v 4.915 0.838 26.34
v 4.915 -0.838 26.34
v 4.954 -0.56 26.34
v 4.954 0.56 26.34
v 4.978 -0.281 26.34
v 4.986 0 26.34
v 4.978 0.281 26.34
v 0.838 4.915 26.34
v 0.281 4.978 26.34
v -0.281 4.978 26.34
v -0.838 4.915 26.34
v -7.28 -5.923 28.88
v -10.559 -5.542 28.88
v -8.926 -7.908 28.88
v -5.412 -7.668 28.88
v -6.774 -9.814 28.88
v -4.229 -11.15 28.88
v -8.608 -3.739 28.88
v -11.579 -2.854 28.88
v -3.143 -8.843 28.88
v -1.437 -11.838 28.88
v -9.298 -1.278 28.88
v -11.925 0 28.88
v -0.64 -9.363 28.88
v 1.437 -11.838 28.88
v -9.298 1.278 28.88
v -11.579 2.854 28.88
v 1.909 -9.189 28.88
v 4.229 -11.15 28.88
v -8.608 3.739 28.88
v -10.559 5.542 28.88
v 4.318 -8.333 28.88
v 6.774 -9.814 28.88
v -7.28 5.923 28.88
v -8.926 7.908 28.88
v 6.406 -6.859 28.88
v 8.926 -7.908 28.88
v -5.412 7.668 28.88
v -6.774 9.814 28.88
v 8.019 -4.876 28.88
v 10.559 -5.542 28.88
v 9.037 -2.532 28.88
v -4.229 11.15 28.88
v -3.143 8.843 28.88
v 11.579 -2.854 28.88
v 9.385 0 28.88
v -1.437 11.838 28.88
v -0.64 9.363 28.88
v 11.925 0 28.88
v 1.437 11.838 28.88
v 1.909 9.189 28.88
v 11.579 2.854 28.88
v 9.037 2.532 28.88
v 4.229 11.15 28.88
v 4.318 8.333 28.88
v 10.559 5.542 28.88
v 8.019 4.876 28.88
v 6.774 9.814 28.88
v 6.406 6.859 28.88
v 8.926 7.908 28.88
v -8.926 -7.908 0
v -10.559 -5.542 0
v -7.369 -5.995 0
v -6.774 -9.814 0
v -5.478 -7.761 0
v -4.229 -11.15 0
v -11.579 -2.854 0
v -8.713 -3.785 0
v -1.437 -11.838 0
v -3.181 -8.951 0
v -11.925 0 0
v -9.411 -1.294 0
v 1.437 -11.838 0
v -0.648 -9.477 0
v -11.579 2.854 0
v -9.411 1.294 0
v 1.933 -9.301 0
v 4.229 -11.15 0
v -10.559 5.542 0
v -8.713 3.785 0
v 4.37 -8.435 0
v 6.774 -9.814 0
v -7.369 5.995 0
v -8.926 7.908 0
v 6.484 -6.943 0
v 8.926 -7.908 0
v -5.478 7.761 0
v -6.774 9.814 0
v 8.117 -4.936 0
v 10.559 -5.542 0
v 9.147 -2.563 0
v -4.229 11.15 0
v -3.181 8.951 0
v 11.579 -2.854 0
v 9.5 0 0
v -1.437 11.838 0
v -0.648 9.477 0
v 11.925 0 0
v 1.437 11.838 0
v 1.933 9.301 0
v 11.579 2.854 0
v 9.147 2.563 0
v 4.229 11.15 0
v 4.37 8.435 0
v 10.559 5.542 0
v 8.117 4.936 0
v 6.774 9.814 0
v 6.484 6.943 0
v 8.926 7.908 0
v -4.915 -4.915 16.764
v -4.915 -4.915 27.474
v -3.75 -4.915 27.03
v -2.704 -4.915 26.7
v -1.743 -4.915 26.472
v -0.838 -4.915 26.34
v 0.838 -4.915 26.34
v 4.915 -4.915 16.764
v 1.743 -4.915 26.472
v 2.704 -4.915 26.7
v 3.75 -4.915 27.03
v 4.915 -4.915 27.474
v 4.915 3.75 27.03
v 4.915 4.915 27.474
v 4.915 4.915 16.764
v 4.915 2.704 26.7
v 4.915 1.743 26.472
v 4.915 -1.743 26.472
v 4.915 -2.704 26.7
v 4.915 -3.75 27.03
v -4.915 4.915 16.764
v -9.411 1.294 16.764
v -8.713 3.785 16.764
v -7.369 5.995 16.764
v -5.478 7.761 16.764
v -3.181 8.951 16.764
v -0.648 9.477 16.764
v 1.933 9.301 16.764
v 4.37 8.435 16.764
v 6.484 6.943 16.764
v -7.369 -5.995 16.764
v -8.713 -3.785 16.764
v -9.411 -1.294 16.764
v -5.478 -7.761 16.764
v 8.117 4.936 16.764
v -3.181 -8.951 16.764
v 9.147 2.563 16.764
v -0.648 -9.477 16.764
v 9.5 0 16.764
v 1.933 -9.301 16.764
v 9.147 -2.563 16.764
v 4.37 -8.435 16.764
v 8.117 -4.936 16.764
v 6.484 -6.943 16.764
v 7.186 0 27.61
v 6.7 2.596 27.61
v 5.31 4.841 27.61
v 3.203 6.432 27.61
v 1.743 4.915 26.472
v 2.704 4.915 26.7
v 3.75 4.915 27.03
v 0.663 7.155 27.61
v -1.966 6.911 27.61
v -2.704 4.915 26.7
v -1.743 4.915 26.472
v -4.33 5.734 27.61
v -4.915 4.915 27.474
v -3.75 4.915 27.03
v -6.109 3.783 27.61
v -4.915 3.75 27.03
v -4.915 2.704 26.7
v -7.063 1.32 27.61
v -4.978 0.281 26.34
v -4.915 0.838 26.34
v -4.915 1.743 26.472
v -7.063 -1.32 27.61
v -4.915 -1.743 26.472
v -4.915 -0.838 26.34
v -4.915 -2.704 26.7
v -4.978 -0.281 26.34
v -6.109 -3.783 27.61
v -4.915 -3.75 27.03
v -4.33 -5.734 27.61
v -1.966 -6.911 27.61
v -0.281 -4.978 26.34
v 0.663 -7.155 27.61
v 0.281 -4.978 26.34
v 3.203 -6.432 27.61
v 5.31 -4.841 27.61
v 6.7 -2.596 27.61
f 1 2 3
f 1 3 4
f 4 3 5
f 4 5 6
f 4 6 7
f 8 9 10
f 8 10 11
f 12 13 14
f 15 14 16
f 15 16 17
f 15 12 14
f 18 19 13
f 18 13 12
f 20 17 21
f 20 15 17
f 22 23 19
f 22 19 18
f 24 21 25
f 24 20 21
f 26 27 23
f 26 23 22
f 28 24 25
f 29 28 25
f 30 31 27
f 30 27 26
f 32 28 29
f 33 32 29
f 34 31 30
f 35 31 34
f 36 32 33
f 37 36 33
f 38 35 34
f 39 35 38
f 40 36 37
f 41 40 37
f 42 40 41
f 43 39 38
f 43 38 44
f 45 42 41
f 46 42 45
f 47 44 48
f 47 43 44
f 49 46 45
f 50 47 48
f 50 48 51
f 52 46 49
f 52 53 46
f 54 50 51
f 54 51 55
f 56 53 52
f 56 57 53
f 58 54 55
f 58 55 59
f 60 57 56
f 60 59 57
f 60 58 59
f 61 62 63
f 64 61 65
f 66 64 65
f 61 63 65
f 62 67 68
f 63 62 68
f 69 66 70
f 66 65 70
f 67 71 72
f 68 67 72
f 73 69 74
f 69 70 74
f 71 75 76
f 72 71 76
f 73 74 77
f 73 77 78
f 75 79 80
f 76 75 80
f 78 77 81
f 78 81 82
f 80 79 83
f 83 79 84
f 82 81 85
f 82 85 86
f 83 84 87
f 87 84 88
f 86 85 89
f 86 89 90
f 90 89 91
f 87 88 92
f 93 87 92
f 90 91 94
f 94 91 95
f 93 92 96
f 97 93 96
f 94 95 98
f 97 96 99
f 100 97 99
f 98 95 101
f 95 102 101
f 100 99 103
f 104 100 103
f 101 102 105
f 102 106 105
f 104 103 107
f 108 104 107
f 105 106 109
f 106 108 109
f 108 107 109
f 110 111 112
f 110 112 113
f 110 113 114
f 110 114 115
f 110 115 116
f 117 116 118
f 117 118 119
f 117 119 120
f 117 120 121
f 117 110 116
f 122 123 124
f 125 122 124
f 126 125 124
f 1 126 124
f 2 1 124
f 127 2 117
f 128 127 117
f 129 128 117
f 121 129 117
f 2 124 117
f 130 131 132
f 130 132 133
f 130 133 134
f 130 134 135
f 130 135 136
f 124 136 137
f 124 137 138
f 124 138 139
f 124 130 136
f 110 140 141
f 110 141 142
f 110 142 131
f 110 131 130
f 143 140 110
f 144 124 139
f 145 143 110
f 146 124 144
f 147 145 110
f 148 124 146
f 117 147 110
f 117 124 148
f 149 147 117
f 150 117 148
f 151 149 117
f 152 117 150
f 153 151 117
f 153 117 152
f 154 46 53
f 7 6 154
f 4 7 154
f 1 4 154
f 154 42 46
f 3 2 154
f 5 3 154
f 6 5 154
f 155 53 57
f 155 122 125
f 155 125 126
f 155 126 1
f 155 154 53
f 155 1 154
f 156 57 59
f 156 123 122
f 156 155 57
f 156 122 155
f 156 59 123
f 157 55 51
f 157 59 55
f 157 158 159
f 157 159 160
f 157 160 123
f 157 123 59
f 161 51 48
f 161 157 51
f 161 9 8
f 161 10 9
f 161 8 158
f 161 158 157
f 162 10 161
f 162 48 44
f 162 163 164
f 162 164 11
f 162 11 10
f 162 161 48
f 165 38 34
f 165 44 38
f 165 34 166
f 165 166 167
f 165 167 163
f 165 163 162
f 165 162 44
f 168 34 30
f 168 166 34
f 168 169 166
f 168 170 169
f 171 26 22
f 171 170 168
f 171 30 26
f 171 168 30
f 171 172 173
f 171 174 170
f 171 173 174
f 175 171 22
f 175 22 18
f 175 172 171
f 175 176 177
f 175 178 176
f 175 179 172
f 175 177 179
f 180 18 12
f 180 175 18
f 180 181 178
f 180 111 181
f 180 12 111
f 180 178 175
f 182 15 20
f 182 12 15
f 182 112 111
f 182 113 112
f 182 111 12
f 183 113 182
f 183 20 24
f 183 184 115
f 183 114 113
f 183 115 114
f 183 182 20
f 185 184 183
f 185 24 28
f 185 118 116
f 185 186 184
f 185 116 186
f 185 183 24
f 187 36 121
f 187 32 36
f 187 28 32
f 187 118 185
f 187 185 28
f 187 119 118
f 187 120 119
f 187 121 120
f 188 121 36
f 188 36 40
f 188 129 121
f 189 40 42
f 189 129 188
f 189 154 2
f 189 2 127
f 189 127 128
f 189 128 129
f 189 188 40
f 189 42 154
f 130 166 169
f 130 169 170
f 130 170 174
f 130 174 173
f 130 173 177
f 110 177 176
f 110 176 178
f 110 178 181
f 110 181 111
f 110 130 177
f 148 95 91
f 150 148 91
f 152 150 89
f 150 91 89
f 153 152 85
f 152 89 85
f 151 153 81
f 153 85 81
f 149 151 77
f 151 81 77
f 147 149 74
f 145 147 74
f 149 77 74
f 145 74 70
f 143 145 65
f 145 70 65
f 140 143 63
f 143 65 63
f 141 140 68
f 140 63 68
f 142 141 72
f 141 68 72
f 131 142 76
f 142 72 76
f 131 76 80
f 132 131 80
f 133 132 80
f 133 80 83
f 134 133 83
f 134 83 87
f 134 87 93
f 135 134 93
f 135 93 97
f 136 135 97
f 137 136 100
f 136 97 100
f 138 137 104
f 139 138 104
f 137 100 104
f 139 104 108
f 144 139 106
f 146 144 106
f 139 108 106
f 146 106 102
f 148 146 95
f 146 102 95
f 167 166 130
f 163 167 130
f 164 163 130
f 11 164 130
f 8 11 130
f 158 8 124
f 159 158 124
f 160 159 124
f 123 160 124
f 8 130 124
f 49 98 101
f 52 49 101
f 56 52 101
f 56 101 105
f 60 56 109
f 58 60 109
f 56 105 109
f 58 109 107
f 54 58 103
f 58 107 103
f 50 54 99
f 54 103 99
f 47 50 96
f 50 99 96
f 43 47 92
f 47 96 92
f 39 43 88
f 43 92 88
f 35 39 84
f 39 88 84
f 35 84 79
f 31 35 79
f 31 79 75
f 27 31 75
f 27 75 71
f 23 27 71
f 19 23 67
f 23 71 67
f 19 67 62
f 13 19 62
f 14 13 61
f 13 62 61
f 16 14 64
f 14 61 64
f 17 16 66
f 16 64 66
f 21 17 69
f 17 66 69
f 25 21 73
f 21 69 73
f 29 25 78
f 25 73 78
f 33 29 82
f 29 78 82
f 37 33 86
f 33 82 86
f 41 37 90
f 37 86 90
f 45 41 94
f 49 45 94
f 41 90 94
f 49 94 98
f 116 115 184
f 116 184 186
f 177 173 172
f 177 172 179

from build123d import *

# Parameters (mm, degrees)
F0_R     = 11.9253
F1_DEPTH = 28.8798
F2_R     = 9.3853
F3_DEPTH = 2.54
F3_TAPER = 60
F4_R     = 9.4996
F5_DEPTH = 16.764
F6_W     = 9.8298
F6_H     = 9.8298
F7_DEPTH = 12.1168001


with BuildPart() as f1:
    # F0 (on Top) → F1 (new body)
    with BuildSketch(Plane.XY):
        Circle(F0_R)
    extrude(amount=F1_DEPTH)

    # F2 (on face) → F3 (cut)
    with BuildSketch(Plane.XY.offset(28.8798)):
        Circle(F2_R)
    extrude(amount=-F3_DEPTH, taper=F3_TAPER, mode=Mode.SUBTRACT)

    # F4 (on face) → F5 (cut)
    with BuildSketch(Plane(origin=(0, 0, 0), x_dir=(1, 0, 0), z_dir=(0, 0, -1))):
        Circle(F4_R)
    extrude(amount=-F5_DEPTH, mode=Mode.SUBTRACT)

    # F6 (on face) → F7 (cut, through all)
    with BuildSketch(Plane(origin=(0, 0, 16.764), x_dir=(1, 0, 0), z_dir=(0, 0, -1))):
        Rectangle(F6_W, F6_H)
    extrude(amount=-F7_DEPTH, mode=Mode.SUBTRACT)


solid = f1.part
